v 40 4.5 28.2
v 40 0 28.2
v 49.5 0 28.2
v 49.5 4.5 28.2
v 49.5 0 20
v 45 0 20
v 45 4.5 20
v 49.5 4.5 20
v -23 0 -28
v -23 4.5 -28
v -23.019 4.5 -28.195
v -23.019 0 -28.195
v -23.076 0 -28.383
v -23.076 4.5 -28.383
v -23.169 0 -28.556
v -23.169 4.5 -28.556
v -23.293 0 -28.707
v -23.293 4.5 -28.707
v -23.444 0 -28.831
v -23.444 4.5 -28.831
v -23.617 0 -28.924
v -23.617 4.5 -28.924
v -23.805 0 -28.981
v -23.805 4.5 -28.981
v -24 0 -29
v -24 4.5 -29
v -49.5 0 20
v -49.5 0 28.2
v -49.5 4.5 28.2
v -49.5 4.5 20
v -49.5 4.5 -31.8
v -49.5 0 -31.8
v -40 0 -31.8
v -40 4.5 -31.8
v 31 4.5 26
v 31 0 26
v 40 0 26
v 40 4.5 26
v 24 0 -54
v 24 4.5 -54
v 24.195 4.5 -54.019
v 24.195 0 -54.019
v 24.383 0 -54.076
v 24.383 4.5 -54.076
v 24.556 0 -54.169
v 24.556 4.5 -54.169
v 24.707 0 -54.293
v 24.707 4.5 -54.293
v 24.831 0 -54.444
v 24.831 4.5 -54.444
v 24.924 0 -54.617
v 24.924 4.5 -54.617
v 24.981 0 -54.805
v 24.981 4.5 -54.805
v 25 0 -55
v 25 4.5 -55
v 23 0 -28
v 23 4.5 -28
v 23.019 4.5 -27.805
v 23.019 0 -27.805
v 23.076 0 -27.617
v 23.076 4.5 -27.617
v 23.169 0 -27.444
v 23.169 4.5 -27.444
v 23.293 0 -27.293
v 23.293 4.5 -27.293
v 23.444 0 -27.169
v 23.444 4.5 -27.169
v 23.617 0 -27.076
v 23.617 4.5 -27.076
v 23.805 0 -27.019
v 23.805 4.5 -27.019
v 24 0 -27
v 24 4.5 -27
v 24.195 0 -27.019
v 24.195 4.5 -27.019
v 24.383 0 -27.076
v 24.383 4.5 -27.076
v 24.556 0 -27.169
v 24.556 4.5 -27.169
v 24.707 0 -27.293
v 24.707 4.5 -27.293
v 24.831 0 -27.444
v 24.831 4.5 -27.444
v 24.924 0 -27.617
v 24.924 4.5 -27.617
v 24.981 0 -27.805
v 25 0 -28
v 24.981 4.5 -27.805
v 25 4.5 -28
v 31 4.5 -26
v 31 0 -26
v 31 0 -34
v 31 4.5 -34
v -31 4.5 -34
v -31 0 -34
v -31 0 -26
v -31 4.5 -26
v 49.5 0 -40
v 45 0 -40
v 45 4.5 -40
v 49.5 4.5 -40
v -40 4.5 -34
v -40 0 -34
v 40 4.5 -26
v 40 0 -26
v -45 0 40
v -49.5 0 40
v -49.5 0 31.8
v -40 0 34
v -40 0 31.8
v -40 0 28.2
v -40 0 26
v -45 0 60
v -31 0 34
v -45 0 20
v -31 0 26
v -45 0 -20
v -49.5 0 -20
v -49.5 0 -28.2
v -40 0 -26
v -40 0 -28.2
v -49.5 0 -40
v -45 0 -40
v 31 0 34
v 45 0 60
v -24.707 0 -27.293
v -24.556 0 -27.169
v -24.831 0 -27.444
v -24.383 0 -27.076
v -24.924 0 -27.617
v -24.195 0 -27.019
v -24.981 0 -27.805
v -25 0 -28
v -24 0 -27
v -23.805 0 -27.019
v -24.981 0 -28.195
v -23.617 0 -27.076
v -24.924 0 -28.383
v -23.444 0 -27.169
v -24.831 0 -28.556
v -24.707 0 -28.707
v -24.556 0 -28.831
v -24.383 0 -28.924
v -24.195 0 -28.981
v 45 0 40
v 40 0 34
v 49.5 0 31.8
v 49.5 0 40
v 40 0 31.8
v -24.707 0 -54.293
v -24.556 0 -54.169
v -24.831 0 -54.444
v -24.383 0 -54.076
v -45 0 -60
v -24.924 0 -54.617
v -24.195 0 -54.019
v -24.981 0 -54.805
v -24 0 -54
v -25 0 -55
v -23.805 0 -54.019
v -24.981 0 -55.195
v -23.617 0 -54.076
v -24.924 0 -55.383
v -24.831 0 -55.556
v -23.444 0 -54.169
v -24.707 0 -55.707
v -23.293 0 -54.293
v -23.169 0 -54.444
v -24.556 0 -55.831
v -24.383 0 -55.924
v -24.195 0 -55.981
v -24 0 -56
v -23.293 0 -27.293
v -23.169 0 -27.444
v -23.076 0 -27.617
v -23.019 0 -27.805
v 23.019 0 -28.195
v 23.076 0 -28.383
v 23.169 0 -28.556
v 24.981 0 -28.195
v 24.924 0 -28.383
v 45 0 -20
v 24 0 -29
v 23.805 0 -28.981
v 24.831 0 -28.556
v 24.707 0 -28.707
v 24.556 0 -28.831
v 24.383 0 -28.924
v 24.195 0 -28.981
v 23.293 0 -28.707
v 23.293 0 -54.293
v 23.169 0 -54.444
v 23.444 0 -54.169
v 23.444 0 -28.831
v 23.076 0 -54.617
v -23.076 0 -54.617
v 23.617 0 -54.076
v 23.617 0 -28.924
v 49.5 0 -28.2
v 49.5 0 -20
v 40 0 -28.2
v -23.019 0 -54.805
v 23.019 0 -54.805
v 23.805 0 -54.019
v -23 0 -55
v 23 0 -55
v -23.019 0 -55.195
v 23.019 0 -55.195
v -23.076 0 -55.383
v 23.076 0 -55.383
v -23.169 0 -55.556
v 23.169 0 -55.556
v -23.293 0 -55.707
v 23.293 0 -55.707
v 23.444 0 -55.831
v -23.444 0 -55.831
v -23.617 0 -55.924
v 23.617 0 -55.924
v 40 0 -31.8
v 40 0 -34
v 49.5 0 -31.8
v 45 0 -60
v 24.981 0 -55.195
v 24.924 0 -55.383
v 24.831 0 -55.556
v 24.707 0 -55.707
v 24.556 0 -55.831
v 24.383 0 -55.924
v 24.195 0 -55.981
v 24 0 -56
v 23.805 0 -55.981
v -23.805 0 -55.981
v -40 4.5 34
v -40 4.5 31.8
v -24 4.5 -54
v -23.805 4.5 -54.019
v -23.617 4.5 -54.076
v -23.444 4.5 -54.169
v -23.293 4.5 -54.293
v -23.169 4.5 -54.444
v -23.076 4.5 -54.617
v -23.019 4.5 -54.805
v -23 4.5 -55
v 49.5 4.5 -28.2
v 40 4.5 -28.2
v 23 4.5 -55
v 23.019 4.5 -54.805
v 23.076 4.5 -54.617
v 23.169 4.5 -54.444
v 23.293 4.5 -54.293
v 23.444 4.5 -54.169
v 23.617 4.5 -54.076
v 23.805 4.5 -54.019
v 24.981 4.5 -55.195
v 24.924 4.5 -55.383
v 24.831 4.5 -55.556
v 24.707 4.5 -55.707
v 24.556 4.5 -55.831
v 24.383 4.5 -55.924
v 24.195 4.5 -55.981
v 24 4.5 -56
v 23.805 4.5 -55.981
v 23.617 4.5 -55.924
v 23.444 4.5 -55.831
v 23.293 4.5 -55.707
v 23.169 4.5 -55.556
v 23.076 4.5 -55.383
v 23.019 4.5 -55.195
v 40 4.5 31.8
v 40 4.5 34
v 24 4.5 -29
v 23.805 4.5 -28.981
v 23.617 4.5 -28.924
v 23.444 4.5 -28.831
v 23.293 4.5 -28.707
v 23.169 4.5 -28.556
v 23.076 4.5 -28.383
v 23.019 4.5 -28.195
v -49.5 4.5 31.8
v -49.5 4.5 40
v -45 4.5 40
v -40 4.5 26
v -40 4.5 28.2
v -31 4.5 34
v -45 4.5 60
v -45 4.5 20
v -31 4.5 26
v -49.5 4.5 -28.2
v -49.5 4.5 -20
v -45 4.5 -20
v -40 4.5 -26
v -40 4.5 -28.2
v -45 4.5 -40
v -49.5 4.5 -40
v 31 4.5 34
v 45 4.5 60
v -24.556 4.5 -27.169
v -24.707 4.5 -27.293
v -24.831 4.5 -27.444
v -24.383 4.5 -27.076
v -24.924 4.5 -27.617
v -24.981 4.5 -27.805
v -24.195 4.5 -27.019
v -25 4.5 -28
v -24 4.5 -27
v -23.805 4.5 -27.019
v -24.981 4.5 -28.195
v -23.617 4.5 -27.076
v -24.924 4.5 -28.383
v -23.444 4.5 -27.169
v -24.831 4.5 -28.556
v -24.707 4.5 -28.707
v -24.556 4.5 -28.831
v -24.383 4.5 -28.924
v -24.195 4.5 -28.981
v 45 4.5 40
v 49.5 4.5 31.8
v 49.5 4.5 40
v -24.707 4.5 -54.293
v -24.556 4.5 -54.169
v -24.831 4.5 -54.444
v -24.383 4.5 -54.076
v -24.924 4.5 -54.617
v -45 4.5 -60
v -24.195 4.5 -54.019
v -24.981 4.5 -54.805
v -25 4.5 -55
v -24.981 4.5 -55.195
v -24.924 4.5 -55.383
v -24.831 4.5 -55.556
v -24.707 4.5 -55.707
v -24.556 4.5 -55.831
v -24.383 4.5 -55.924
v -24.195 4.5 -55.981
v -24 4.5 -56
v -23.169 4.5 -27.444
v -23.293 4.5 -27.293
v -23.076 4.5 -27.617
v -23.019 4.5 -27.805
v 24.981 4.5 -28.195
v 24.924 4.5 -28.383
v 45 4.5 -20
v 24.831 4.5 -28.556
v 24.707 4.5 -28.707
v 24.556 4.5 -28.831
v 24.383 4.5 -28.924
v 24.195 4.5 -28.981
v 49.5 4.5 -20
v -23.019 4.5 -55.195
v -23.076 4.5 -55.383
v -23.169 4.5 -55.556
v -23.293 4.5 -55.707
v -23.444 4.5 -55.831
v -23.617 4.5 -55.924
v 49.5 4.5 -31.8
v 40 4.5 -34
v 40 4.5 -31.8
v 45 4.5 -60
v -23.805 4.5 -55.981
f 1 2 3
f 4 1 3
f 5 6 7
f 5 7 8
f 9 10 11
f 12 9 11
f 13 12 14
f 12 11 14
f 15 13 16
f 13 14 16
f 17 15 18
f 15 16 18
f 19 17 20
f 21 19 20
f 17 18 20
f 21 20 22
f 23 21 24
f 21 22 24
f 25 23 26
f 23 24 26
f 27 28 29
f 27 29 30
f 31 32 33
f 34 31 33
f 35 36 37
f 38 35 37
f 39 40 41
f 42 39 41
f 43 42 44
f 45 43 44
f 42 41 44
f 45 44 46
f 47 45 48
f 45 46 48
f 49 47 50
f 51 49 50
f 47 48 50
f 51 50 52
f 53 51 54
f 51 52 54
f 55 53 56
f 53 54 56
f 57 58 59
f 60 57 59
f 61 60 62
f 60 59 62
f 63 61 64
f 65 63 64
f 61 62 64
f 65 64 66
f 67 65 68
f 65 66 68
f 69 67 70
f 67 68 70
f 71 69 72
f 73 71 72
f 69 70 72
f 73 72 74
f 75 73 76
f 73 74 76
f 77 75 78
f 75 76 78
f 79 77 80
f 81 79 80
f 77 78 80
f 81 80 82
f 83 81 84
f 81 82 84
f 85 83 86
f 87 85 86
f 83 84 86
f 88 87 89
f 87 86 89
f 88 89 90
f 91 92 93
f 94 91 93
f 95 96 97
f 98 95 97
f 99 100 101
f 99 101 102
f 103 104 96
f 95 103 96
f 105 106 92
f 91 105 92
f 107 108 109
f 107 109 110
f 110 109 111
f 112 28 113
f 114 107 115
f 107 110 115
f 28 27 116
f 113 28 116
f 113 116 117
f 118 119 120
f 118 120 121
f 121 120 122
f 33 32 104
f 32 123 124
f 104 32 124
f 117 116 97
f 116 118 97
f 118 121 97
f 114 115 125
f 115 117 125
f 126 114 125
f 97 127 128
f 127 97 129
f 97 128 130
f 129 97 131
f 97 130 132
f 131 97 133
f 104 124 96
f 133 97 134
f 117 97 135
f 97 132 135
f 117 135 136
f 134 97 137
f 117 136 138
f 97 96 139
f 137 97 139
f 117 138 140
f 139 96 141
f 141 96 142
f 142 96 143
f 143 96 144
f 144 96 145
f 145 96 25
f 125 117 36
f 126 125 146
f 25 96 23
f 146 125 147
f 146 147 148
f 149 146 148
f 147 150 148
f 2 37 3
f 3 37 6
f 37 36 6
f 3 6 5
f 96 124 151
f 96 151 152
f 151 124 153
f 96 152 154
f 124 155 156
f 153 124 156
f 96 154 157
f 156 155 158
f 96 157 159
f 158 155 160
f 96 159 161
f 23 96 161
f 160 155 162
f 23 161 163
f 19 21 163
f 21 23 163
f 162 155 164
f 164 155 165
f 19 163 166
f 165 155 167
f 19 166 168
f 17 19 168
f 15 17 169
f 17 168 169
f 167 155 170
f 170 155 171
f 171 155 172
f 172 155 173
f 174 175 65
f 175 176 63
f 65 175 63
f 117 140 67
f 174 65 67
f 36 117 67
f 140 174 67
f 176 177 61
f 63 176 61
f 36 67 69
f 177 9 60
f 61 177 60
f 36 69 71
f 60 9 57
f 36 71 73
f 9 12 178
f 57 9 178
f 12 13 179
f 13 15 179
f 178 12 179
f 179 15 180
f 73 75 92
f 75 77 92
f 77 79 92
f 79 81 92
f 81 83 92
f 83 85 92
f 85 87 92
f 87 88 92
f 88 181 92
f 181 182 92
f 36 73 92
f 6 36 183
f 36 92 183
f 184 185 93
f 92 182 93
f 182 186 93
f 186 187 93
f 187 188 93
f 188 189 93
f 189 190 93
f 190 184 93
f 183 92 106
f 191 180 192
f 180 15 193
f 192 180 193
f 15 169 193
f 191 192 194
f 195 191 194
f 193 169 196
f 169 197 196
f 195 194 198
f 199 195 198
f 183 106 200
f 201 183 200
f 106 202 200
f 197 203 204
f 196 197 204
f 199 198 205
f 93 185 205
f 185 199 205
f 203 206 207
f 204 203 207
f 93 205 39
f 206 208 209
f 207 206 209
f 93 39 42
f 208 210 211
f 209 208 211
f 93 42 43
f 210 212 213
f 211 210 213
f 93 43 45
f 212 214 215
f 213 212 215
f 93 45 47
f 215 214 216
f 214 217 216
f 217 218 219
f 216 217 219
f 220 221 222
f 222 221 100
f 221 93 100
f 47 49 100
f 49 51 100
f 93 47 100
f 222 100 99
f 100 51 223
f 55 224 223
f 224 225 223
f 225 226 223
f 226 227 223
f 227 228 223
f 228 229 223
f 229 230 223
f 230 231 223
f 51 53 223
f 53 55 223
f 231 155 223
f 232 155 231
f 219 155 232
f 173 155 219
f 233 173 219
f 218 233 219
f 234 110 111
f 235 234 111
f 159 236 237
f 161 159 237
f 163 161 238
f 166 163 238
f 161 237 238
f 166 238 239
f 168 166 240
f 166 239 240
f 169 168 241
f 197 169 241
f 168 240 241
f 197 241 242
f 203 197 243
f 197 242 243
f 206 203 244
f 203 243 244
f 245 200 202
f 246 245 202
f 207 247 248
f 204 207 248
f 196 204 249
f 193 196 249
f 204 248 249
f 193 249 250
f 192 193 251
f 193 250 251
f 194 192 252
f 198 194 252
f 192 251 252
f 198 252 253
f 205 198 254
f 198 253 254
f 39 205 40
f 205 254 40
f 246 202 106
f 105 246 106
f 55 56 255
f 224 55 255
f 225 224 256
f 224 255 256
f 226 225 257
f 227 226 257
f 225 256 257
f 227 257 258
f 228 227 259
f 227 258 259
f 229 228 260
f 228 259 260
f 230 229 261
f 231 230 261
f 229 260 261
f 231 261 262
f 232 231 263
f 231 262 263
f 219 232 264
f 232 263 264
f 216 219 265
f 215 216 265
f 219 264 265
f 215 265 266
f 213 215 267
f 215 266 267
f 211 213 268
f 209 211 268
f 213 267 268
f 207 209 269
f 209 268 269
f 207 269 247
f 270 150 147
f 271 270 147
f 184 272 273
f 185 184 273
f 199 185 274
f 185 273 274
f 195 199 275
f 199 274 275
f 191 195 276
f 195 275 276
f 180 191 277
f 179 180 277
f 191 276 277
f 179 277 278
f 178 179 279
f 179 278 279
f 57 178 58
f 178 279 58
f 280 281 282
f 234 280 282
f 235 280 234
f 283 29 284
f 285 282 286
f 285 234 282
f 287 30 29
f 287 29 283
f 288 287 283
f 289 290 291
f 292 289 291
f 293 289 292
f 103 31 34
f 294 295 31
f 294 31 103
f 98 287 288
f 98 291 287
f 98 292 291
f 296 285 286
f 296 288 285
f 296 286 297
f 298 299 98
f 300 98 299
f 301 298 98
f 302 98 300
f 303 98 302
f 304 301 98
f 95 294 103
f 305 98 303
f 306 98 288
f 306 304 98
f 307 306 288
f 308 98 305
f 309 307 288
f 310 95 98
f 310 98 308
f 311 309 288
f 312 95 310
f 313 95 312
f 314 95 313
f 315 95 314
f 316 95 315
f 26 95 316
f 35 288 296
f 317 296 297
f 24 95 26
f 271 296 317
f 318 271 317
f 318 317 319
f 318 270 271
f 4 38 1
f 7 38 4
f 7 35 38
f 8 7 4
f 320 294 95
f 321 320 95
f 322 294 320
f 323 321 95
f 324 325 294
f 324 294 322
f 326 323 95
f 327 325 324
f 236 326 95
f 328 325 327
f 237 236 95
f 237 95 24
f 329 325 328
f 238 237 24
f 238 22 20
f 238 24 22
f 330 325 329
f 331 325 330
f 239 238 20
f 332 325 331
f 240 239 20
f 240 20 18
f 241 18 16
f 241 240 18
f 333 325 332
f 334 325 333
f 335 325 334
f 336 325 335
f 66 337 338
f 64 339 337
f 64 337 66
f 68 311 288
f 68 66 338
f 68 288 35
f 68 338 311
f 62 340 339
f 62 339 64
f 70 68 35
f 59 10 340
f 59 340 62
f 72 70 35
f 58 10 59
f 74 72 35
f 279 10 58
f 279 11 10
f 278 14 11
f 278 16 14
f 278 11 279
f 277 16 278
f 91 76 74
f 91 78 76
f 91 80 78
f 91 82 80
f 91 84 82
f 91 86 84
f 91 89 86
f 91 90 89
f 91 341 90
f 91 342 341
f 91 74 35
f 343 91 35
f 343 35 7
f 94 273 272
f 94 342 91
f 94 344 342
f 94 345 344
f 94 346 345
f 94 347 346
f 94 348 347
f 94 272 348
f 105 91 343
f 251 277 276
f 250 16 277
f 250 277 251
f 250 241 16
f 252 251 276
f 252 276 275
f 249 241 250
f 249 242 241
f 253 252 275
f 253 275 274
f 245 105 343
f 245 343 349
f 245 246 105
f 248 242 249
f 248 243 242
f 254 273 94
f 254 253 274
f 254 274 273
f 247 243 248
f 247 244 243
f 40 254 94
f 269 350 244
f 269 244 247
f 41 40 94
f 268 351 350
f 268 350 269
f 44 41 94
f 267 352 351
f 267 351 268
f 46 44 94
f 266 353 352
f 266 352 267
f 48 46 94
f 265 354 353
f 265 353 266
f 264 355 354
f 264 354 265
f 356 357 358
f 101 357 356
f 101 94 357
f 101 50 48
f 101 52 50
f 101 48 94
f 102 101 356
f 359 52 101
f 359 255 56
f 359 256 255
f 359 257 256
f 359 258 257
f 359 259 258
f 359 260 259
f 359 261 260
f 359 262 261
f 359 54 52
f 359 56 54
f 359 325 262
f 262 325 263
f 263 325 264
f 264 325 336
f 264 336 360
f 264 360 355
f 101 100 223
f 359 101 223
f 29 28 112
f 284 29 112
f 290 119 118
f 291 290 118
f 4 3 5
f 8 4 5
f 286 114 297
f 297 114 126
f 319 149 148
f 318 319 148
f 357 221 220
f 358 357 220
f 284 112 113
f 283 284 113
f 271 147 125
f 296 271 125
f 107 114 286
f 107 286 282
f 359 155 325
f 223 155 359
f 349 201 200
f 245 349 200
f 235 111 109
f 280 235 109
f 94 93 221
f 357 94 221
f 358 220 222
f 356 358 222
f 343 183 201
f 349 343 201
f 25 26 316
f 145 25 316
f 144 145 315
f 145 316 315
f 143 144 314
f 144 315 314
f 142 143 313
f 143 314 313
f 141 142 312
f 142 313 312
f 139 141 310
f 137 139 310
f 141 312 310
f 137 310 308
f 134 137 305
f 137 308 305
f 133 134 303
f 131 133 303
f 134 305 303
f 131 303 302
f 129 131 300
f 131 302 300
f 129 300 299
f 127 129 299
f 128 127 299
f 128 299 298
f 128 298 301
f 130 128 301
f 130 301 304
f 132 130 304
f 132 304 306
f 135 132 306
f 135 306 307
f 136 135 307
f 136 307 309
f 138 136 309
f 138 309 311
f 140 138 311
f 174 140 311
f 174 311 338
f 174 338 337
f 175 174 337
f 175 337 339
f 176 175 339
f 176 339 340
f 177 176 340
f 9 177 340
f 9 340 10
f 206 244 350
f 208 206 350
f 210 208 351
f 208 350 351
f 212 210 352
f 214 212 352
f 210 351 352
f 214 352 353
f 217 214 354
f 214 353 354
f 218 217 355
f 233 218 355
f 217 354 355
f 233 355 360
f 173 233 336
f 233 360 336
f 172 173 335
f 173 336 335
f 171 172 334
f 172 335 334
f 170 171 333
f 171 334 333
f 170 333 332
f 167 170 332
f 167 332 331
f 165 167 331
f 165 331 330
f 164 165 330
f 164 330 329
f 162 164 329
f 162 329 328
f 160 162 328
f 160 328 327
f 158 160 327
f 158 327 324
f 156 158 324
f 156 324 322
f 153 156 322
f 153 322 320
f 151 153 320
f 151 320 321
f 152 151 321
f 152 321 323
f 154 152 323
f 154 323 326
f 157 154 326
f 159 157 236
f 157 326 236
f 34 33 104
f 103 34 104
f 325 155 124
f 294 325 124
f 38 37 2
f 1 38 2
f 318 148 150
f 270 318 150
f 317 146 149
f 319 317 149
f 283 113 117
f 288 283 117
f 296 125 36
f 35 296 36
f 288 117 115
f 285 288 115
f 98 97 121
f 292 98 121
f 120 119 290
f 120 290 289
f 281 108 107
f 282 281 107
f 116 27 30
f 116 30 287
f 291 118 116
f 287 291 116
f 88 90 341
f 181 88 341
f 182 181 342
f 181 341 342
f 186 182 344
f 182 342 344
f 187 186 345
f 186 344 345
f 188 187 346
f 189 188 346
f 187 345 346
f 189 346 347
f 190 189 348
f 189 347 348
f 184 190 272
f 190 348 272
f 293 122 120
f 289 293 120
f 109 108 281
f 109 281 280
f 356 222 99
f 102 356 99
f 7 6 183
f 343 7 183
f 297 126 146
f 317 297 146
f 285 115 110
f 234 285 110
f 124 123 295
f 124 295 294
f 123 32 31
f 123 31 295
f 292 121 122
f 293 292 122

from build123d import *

# Parameters (mm, degrees)
SKETCH1_W           = 90
SKETCH1_H           = 20
SKETCH1_W_2         = 4.5
SKETCH1_H_2         = 8.2
SKETCH1_W_3         = 62
SKETCH1_H_3         = 3.6
SKETCH1_H_4         = 40
BOSS_EXTRUDE1_DEPTH = 4.5
CUT_EXTRUDE1_DEPTH  = 10


with BuildPart() as part:
    # Sketch1 → Boss-Extrude1 (new body)
    with BuildSketch(Plane(origin=(0, 0, 0), x_dir=(1, 0, 0), z_dir=(0, 1, 0))):
        with Locations((0, 50)):
            Rectangle(SKETCH1_W, SKETCH1_H)
        Polygon((-45, 40), (-45, 31.8), (-40, 31.8), (-40, 34), (-31, 34), (-31, 31.8), (31, 31.8), (31, 34), (40, 34), (40, 31.8), (45, 31.8), (45, 40), align=None)
        with Locations((-47.25, 35.9)):
            Rectangle(SKETCH1_W_2, SKETCH1_H_2)
        with Locations((-47.25, 24.1)):
            Rectangle(SKETCH1_W_2, SKETCH1_H_2)
        Polygon((-45, 28.2), (-45, 20), (45, 20), (45, 28.2), (40, 28.2), (40, 26), (31, 26), (31, 28.2), (-31, 28.2), (-31, 26), (-40, 26), (-40, 28.2), align=None)
        with Locations((0, 30)):
            Rectangle(SKETCH1_W_3, SKETCH1_H_3)
        Rectangle(SKETCH1_W, SKETCH1_H_4)
        Polygon((-45, -20), (-45, -28.2), (-40, -28.2), (-40, -26), (-31, -26), (-31, -28.2), (31, -28.2), (31, -26), (40, -26), (40, -28.2), (45, -28.2), (45, -20), align=None)
        with Locations((-47.25, -24.1)):
            Rectangle(SKETCH1_W_2, SKETCH1_H_2)
        with Locations((-47.25, -35.9)):
            Rectangle(SKETCH1_W_2, SKETCH1_H_2)
        Polygon((-45, -31.8), (-45, -40), (45, -40), (45, -31.8), (40, -31.8), (40, -34), (31, -34), (31, -31.8), (-31, -31.8), (-31, -34), (-40, -34), (-40, -31.8), align=None)
        with Locations((0, -30)):
            Rectangle(SKETCH1_W_3, SKETCH1_H_3)
        with Locations((47.25, -24.1)):
            Rectangle(SKETCH1_W_2, SKETCH1_H_2)
        with Locations((47.25, -35.9)):
            Rectangle(SKETCH1_W_2, SKETCH1_H_2)
        with Locations((47.25, 24.1)):
            Rectangle(SKETCH1_W_2, SKETCH1_H_2)
        with Locations((47.25, 35.9)):
            Rectangle(SKETCH1_W_2, SKETCH1_H_2)
        with Locations((0, -50)):
            Rectangle(SKETCH1_W, SKETCH1_H)
    extrude(amount=BOSS_EXTRUDE1_DEPTH)

    # Sketch2 → Cut-Extrude1 (cut)
    with BuildSketch(Plane(origin=(0, 4.5, 0), x_dir=(1, 0, 0), z_dir=(0, 1, 0))):
        with BuildLine():
            ThreePointArc((-23, 55), (-24.707106781, 55.707106781), (-24, 54))
            Line((-24, 54), (-24, 55))
            Line((-24, 55), (-23, 55))
        make_face()
        with BuildLine():
            Line((-24, 55), (-24, 54))
            ThreePointArc((-24, 54), (-23.292893219, 54.292893219), (-23, 55))
            Line((-23, 55), (-24, 55))
        make_face()
        with BuildLine():
            ThreePointArc((23, 55), (23.292893219, 54.292893219), (24, 54))
            Line((24, 54), (24, 55))
            Line((24, 55), (23, 55))
        make_face()
        with BuildLine():
            Line((24, 55), (24, 54))
            ThreePointArc((24, 54), (24.707106781, 54.292893219), (25, 55))
            ThreePointArc((25, 55), (24, 56), (23, 55))
            Line((23, 55), (24, 55))
        make_face()
        with BuildLine():
            ThreePointArc((24, 29), (23.292893219, 28.707106781), (23, 28))
            Line((23, 28), (24, 28))
            Line((24, 28), (24, 29))
        make_face()
        with BuildLine():
            Line((24, 28), (23, 28))
            ThreePointArc((23, 28), (24, 27), (25, 28))
            ThreePointArc((25, 28), (24.707106781, 28.707106781), (24, 29))
            Line((24, 29), (24, 28))
        make_face()
        with BuildLine():
            Line((-24, 29), (-24, 28))
            Line((-24, 28), (-23, 28))
            ThreePointArc((-23, 28), (-23.292893219, 28.707106781), (-24, 29))
        make_face()
        with BuildLine():
            Line((-23, 28), (-24, 28))
            Line((-24, 28), (-24, 29))
            ThreePointArc((-24, 29), (-24.707106781, 27.292893219), (-23, 28))
        make_face()
    extrude(amount=-CUT_EXTRUDE1_DEPTH, mode=Mode.SUBTRACT)


solid = part.part
